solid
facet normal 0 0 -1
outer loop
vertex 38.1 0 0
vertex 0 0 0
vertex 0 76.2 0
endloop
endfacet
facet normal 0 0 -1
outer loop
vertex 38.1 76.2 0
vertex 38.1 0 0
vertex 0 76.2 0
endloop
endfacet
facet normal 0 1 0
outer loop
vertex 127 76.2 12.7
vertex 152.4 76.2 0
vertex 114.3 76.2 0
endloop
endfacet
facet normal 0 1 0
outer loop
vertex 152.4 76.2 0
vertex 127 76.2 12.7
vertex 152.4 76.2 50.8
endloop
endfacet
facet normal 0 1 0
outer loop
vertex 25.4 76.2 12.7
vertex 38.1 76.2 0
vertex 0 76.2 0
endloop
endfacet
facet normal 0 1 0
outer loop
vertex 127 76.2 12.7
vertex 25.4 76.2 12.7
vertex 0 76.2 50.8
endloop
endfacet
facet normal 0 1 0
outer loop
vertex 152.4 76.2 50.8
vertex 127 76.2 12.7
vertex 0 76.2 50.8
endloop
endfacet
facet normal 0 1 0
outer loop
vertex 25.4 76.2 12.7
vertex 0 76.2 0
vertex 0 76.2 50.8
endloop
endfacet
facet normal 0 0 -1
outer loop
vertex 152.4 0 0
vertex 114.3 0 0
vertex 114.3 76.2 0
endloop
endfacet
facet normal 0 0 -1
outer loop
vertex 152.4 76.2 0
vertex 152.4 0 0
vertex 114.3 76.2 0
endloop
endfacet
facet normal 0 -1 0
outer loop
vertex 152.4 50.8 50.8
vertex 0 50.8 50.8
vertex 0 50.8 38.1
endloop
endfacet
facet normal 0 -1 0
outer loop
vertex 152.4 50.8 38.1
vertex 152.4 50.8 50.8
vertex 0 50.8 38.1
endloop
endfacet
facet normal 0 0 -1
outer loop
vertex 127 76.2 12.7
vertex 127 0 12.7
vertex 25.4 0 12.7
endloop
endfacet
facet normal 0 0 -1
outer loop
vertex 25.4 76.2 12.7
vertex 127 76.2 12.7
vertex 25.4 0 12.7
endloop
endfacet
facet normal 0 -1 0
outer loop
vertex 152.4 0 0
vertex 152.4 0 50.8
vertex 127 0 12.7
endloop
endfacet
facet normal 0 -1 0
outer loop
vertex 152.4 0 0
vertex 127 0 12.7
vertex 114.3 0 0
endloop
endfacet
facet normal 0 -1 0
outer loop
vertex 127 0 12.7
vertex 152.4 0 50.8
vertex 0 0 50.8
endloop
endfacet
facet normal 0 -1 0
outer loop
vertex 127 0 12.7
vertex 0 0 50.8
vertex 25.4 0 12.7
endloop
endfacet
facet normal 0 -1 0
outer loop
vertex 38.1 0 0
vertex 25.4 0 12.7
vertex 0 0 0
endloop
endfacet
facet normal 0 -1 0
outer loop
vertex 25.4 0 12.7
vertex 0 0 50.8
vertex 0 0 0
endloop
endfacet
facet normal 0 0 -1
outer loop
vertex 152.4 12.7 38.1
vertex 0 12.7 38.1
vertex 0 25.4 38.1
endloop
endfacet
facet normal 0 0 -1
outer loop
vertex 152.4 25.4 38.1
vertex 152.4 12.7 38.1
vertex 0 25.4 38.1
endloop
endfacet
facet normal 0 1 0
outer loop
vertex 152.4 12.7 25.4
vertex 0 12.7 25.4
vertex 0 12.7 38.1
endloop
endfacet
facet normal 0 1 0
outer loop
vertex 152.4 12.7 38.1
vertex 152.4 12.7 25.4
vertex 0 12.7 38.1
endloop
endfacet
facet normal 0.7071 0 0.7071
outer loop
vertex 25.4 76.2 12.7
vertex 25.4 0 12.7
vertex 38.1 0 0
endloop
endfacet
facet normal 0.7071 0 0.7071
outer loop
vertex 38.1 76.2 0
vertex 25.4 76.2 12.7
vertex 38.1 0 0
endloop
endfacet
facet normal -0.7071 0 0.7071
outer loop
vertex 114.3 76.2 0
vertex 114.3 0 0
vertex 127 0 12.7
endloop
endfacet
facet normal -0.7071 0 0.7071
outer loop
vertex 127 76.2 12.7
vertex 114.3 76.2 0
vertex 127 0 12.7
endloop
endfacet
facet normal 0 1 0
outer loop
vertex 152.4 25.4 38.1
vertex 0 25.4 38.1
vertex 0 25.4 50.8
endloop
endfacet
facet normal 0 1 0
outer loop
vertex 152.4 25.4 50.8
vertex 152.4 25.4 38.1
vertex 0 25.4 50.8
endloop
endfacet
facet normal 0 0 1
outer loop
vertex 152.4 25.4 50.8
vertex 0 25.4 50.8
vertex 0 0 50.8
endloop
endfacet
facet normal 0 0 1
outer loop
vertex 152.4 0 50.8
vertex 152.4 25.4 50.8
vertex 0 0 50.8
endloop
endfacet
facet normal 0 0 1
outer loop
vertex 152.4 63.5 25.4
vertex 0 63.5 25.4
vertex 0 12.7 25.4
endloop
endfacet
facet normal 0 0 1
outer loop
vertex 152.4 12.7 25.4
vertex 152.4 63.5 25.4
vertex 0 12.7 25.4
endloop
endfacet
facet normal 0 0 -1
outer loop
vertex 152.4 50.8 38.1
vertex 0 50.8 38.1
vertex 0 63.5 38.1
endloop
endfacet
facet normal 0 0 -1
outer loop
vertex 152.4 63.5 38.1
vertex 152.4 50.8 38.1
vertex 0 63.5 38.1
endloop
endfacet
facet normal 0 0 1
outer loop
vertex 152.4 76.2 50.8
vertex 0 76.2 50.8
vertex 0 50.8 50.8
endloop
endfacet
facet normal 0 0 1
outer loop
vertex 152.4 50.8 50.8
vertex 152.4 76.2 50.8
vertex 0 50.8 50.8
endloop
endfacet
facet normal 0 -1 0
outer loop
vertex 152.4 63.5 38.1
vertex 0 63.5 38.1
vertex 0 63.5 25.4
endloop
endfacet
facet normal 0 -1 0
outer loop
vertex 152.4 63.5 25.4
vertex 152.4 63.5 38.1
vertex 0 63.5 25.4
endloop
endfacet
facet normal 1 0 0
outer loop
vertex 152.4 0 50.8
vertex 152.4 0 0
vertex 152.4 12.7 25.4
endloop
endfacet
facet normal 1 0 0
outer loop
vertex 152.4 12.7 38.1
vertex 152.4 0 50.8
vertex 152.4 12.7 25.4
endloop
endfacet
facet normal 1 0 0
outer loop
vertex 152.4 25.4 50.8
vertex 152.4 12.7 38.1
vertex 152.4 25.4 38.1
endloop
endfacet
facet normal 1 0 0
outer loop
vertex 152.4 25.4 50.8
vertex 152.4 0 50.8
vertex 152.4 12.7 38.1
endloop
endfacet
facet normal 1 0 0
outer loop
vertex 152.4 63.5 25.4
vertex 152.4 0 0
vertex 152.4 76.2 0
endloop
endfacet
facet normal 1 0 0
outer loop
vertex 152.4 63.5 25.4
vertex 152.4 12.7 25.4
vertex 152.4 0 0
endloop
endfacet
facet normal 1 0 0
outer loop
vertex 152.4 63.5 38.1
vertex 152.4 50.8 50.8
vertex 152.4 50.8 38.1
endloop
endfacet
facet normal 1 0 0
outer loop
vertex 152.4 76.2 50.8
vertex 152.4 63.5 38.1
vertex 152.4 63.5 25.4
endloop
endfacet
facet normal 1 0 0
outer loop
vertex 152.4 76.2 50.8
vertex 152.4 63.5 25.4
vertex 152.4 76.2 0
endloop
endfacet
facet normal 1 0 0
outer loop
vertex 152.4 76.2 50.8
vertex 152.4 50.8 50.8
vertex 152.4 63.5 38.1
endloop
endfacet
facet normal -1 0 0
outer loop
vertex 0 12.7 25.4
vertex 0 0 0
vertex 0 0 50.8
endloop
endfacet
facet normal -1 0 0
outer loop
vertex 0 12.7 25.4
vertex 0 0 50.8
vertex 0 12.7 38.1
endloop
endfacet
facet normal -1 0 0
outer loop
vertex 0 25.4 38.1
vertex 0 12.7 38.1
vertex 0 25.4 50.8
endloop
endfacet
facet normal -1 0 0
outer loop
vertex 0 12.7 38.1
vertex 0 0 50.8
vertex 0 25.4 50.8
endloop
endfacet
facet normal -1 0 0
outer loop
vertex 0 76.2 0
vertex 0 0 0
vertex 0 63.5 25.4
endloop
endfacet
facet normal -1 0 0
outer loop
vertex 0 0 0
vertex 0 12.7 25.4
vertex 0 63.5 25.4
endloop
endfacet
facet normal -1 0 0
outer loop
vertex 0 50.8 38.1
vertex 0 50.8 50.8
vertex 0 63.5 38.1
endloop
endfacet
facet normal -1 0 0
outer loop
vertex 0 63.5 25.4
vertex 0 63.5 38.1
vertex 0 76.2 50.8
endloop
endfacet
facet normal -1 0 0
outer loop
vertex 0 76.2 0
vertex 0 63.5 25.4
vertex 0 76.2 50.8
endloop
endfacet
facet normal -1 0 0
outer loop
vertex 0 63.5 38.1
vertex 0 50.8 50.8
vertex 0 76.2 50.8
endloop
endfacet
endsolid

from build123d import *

# Parameters (mm, degrees)
F1_DEPTH = 152.4
F3_DEPTH = 80.772


with BuildPart() as f1:
    # F0 (on Right) → F1 (new body)
    with BuildSketch(Plane.YZ):
        Polygon((0, 50.8), (0, 0), (76.2, 0), (76.2, 50.8), (50.8, 50.8), (50.8, 38.1), (63.5, 38.1), (63.5, 25.4), (12.7, 25.4), (12.7, 38.1), (25.4, 38.1), (25.4, 50.8), align=None)
    extrude(amount=F1_DEPTH)

    # F2 (on face) → F3 (cut)
    with BuildSketch(Plane.XZ):
        Polygon((25.4, 12.7), (38.1, 0), (114.3, 0), (127, 12.7), align=None)
    extrude(amount=-F3_DEPTH, mode=Mode.SUBTRACT)


solid = f1.part
